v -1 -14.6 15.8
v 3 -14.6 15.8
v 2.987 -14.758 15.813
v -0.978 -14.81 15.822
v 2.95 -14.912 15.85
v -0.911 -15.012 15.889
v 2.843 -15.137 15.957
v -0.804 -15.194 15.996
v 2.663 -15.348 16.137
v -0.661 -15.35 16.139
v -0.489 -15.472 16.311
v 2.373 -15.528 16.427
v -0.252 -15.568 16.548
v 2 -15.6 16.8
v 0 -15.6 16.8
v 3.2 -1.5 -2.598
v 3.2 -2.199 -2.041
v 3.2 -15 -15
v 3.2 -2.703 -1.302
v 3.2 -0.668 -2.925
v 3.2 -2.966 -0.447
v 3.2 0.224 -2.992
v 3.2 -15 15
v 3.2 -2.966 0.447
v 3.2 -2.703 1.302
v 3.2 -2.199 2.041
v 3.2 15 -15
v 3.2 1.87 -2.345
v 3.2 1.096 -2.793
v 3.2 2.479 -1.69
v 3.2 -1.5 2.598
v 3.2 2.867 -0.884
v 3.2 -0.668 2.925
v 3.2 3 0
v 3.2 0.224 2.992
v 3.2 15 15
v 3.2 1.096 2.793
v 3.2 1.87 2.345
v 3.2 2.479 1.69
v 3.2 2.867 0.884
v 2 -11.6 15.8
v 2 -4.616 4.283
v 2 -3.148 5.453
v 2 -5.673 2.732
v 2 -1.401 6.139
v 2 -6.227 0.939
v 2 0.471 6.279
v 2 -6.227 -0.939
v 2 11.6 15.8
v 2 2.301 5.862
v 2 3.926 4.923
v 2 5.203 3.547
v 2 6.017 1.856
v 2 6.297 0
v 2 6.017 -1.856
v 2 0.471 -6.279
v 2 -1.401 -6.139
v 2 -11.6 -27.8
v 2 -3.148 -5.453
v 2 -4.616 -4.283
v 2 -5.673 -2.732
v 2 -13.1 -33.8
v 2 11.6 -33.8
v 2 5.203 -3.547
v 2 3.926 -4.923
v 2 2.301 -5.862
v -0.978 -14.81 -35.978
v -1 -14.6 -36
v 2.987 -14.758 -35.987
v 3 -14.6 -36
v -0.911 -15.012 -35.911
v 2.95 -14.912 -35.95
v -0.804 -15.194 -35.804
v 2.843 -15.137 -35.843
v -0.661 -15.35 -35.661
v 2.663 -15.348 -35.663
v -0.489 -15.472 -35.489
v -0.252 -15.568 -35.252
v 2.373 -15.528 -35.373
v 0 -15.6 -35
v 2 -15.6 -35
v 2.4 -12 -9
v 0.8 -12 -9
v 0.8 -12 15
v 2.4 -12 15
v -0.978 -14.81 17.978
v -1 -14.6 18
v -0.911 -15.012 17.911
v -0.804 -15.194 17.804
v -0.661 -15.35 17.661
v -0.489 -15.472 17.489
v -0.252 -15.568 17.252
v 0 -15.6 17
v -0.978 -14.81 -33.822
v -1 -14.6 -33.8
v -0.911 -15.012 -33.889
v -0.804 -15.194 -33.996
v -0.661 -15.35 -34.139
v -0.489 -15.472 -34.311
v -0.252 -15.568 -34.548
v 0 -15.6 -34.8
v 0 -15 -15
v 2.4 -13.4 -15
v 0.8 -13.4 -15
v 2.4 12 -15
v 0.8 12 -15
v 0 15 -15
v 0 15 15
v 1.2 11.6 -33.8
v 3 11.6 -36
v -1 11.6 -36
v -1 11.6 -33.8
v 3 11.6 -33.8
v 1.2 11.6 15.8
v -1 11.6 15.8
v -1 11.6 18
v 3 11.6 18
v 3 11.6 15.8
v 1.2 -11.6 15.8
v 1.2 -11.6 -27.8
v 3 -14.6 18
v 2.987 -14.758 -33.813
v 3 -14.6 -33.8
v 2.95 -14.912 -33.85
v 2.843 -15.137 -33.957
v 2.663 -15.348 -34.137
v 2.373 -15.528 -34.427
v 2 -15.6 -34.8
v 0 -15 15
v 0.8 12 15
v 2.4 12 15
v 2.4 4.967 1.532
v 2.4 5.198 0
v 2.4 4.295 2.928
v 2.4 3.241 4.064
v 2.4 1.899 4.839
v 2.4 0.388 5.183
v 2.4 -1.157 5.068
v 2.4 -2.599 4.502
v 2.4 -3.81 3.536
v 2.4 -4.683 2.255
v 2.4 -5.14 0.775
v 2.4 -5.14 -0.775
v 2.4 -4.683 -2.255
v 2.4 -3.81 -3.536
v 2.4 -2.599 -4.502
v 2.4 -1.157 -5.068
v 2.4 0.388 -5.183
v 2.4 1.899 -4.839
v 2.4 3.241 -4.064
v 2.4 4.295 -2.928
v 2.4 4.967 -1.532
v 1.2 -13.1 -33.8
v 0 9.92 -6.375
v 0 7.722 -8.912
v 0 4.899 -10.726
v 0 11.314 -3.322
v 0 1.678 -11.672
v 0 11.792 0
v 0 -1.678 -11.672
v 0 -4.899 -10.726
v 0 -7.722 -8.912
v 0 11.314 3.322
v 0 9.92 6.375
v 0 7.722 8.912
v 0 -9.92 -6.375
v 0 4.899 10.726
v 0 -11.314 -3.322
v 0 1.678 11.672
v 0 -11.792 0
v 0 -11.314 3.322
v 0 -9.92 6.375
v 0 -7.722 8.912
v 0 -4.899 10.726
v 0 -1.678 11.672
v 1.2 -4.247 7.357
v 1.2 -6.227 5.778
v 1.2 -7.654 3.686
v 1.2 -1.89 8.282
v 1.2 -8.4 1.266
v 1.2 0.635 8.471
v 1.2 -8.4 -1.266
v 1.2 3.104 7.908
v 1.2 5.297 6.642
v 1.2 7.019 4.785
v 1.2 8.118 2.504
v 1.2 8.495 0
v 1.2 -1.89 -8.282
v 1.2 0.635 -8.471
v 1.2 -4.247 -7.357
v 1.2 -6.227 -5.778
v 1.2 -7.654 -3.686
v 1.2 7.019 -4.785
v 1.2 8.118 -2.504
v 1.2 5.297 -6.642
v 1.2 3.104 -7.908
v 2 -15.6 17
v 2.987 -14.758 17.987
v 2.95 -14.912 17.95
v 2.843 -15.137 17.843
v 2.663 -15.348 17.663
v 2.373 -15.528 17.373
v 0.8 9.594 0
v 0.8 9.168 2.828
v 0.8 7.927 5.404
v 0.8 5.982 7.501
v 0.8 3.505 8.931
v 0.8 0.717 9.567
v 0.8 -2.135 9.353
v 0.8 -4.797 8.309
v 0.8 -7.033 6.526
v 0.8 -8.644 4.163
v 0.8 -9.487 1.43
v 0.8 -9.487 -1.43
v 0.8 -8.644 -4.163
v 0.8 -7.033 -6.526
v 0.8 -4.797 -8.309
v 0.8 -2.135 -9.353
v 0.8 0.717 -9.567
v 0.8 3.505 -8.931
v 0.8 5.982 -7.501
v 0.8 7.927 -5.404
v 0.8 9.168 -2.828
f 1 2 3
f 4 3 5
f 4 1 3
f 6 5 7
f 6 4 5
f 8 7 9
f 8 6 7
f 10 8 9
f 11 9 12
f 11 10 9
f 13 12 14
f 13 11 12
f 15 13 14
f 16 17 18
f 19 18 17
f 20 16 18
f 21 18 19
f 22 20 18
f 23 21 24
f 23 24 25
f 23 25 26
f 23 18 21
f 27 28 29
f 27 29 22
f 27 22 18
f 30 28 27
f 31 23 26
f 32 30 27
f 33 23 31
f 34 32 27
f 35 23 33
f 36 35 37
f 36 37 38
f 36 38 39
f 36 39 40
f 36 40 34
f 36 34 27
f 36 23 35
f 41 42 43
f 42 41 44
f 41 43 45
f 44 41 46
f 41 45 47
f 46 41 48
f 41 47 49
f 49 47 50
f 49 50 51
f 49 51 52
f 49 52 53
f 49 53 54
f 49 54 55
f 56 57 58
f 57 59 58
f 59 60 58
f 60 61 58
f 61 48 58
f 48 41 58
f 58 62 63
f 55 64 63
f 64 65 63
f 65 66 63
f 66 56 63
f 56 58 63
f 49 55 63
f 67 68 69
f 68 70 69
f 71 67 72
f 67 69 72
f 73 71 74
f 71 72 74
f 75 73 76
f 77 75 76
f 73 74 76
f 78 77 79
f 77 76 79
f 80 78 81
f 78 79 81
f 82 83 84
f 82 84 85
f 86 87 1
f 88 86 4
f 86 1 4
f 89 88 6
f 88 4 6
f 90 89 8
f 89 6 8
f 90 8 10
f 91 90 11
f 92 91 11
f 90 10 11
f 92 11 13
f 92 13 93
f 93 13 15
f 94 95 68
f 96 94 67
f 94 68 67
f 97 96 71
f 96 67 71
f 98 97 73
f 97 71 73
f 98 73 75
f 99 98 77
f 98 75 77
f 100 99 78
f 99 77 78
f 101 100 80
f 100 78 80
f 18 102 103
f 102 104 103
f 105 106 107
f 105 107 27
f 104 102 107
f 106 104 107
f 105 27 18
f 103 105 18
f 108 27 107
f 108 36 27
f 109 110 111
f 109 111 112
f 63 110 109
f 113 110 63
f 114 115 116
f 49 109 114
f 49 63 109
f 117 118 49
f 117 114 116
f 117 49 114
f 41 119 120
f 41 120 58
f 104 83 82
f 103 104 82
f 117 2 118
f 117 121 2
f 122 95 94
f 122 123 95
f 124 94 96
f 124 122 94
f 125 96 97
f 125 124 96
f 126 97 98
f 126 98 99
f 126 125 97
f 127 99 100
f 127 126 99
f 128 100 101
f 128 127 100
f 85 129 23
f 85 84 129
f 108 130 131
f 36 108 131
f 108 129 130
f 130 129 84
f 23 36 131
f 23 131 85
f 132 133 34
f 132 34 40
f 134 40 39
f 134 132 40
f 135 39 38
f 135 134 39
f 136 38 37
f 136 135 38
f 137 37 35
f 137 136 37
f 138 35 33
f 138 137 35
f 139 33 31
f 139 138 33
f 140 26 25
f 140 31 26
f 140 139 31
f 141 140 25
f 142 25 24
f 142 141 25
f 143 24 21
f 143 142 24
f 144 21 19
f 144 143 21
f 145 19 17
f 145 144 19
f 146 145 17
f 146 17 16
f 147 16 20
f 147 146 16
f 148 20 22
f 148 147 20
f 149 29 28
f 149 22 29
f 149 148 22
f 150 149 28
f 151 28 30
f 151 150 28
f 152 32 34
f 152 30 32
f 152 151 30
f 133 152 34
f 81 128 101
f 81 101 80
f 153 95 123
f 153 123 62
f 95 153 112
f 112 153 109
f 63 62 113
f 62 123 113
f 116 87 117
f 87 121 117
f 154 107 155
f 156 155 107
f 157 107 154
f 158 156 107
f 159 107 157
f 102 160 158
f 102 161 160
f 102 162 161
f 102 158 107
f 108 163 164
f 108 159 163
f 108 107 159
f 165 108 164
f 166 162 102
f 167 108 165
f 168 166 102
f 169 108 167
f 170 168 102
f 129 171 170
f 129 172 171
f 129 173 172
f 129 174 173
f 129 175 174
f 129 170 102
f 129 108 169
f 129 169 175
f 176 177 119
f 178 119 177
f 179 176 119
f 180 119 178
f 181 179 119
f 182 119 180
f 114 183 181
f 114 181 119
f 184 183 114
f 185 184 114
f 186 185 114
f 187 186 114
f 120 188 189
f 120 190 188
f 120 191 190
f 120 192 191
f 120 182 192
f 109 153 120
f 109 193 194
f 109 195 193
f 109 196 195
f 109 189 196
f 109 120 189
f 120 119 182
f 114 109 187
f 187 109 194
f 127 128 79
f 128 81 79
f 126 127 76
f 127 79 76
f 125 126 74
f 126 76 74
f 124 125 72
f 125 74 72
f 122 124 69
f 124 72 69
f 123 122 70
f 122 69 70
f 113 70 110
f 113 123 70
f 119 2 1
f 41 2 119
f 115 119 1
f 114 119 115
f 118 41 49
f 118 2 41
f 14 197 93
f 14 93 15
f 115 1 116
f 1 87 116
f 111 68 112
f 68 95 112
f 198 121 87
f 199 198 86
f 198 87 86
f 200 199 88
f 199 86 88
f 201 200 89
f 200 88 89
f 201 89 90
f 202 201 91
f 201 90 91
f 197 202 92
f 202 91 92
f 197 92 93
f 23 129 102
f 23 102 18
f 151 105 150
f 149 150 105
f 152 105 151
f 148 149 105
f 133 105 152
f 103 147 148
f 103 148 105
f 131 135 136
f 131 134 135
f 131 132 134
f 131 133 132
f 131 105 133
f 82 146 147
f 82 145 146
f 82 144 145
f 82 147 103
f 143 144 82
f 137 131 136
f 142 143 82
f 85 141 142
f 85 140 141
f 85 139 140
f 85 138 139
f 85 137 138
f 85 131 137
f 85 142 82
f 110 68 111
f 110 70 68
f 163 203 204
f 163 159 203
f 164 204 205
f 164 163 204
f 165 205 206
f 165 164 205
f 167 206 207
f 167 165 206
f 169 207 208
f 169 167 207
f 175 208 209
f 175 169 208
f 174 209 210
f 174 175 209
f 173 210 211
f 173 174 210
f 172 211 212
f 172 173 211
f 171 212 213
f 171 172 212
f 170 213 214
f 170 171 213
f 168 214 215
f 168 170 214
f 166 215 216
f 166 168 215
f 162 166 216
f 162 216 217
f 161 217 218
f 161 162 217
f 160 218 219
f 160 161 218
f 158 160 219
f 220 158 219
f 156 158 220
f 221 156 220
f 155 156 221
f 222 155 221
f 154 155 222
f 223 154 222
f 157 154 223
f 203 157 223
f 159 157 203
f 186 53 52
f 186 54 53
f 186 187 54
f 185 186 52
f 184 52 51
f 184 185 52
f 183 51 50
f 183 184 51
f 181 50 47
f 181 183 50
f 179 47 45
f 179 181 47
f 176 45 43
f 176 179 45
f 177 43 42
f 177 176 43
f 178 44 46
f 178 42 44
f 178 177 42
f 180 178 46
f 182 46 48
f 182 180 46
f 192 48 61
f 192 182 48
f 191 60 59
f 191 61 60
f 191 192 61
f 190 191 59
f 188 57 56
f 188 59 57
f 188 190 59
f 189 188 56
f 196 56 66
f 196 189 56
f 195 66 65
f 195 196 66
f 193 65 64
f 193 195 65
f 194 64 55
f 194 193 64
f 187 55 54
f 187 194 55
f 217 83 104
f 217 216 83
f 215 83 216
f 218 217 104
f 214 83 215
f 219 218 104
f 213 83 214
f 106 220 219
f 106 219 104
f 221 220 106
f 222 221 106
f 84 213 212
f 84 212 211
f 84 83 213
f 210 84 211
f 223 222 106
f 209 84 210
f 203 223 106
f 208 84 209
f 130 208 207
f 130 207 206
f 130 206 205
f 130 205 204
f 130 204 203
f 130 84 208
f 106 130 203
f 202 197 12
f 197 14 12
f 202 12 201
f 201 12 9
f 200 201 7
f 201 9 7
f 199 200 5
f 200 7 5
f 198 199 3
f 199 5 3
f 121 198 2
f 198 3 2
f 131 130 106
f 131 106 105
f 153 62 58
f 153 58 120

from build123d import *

# Parameters (mm, degrees)
F0_W          = 1.6
F0_H          = 3
F1_DEPTH      = 15
F2_W          = 0.8
F2_H          = 23.2
F3_DEPTH      = 50
F3_DEPTH_BACK = 2
F4_R          = 3
F5_DEPTH      = 25
F5_TAPER      = -70
F6_W          = 27.2
F6_H          = 1.2
F6_H_2        = 1
F7_DEPTH      = 1
F7_DEPTH_BACK = 3
F8_R          = 1
F9_SIZE2      = 6
F9_SIZE       = 1.5
F10_SIZE2     = 6
F10_SIZE      = 1.4


with BuildPart() as f1:
    # F0 (on Top) → F1 (new body, symmetric)
    with BuildSketch(Plane.XY):
        Polygon((0.8, 15), (0, 15), (0, -15), (0.8, -15), (0.8, -12), (0.8, 12), align=None)
        with Locations((1.6, 13.5)):
            Rectangle(F0_W, F0_H)
        Polygon((3.2, 15), (2.4, 15), (2.4, 12), (2.4, -12), (2.4, -15), (3.2, -15), align=None)
        with Locations((1.6, -13.5)):
            Rectangle(F0_W, F0_H)
    extrude(amount=F1_DEPTH, both=True)


with BuildPart() as f3:
    # F2 (on face) → F3 (new body, two sides)
    with BuildSketch(Plane.XY.offset(15)) as f3_sk:
        with Locations((1.6, 0)):
            Rectangle(F2_W, F2_H)
    extrude(amount=-F3_DEPTH)
    extrude(f3_sk.sketch, amount=F3_DEPTH_BACK)


with BuildPart() as f5_tool:
    # F4 (on face) → F5 (new body)
    with BuildSketch(Plane.YZ.offset(3.2)):
        Circle(F4_R)
    extrude(amount=-F5_DEPTH, taper=F5_TAPER)


with BuildPart() as f1_1:
    add(f1.part)

    # F5: cut by f5_tool
    add(f5_tool.part, mode=Mode.SUBTRACT)

    # F10
    f10_edges = [f1_1.edges().sort_by_distance(p)[0] for p in [
        (1.6, -12, -15),
    ]]
    f10_side = f1_1.faces().sort_by_distance((0.301702, 0, -15))[0]
    chamfer(f10_edges, length=F10_SIZE, length2=F10_SIZE2, reference=f10_side)


with BuildPart() as f3_1:
    add(f3.part)

    # F5: cut by f5_tool
    add(f5_tool.part, mode=Mode.SUBTRACT)

    # F6 (on face) → F7 (join, two sides)
    with BuildSketch(Plane.YZ.offset(2)) as f7_sk:
        with Locations((-2, 16.4)):
            Rectangle(F6_W, F6_H)
        with Locations((-2, 17.5)):
            Rectangle(F6_W, F6_H_2)
        with Locations((-2, -35.5)):
            Rectangle(F6_W, F6_H_2)
        with Locations((-2, -34.4)):
            Rectangle(F6_W, F6_H)
    extrude(amount=F7_DEPTH)
    extrude(f7_sk.sketch, amount=-F7_DEPTH_BACK)

    # F8
    f8_edges = [f3_1.edges().sort_by_distance(p)[0] for p in [
        (3, -15.6, -34.9),
        (1, -15.6, -36),
        (-1, -15.6, -34.9),
        (1, -15.6, -33.8),
        (3, -15.6, 16.9),
        (1, -15.6, 15.8),
        (-1, -15.6, 16.9),
        (1, -15.6, 18),
    ]]
    fillet(f8_edges, radius=F8_R)

    # F9
    f9_edges = [f3_1.edges().sort_by_distance(p)[0] for p in [
        (1.6, -11.6, -33.8),
    ]]
    f9_side = f3_1.faces().sort_by_distance((0.870872, -1.82282, -33.8))[0]
    chamfer(f9_edges, length=F9_SIZE, length2=F9_SIZE2, reference=f9_side)


solid = Compound([f1_1.part, f3_1.part])
